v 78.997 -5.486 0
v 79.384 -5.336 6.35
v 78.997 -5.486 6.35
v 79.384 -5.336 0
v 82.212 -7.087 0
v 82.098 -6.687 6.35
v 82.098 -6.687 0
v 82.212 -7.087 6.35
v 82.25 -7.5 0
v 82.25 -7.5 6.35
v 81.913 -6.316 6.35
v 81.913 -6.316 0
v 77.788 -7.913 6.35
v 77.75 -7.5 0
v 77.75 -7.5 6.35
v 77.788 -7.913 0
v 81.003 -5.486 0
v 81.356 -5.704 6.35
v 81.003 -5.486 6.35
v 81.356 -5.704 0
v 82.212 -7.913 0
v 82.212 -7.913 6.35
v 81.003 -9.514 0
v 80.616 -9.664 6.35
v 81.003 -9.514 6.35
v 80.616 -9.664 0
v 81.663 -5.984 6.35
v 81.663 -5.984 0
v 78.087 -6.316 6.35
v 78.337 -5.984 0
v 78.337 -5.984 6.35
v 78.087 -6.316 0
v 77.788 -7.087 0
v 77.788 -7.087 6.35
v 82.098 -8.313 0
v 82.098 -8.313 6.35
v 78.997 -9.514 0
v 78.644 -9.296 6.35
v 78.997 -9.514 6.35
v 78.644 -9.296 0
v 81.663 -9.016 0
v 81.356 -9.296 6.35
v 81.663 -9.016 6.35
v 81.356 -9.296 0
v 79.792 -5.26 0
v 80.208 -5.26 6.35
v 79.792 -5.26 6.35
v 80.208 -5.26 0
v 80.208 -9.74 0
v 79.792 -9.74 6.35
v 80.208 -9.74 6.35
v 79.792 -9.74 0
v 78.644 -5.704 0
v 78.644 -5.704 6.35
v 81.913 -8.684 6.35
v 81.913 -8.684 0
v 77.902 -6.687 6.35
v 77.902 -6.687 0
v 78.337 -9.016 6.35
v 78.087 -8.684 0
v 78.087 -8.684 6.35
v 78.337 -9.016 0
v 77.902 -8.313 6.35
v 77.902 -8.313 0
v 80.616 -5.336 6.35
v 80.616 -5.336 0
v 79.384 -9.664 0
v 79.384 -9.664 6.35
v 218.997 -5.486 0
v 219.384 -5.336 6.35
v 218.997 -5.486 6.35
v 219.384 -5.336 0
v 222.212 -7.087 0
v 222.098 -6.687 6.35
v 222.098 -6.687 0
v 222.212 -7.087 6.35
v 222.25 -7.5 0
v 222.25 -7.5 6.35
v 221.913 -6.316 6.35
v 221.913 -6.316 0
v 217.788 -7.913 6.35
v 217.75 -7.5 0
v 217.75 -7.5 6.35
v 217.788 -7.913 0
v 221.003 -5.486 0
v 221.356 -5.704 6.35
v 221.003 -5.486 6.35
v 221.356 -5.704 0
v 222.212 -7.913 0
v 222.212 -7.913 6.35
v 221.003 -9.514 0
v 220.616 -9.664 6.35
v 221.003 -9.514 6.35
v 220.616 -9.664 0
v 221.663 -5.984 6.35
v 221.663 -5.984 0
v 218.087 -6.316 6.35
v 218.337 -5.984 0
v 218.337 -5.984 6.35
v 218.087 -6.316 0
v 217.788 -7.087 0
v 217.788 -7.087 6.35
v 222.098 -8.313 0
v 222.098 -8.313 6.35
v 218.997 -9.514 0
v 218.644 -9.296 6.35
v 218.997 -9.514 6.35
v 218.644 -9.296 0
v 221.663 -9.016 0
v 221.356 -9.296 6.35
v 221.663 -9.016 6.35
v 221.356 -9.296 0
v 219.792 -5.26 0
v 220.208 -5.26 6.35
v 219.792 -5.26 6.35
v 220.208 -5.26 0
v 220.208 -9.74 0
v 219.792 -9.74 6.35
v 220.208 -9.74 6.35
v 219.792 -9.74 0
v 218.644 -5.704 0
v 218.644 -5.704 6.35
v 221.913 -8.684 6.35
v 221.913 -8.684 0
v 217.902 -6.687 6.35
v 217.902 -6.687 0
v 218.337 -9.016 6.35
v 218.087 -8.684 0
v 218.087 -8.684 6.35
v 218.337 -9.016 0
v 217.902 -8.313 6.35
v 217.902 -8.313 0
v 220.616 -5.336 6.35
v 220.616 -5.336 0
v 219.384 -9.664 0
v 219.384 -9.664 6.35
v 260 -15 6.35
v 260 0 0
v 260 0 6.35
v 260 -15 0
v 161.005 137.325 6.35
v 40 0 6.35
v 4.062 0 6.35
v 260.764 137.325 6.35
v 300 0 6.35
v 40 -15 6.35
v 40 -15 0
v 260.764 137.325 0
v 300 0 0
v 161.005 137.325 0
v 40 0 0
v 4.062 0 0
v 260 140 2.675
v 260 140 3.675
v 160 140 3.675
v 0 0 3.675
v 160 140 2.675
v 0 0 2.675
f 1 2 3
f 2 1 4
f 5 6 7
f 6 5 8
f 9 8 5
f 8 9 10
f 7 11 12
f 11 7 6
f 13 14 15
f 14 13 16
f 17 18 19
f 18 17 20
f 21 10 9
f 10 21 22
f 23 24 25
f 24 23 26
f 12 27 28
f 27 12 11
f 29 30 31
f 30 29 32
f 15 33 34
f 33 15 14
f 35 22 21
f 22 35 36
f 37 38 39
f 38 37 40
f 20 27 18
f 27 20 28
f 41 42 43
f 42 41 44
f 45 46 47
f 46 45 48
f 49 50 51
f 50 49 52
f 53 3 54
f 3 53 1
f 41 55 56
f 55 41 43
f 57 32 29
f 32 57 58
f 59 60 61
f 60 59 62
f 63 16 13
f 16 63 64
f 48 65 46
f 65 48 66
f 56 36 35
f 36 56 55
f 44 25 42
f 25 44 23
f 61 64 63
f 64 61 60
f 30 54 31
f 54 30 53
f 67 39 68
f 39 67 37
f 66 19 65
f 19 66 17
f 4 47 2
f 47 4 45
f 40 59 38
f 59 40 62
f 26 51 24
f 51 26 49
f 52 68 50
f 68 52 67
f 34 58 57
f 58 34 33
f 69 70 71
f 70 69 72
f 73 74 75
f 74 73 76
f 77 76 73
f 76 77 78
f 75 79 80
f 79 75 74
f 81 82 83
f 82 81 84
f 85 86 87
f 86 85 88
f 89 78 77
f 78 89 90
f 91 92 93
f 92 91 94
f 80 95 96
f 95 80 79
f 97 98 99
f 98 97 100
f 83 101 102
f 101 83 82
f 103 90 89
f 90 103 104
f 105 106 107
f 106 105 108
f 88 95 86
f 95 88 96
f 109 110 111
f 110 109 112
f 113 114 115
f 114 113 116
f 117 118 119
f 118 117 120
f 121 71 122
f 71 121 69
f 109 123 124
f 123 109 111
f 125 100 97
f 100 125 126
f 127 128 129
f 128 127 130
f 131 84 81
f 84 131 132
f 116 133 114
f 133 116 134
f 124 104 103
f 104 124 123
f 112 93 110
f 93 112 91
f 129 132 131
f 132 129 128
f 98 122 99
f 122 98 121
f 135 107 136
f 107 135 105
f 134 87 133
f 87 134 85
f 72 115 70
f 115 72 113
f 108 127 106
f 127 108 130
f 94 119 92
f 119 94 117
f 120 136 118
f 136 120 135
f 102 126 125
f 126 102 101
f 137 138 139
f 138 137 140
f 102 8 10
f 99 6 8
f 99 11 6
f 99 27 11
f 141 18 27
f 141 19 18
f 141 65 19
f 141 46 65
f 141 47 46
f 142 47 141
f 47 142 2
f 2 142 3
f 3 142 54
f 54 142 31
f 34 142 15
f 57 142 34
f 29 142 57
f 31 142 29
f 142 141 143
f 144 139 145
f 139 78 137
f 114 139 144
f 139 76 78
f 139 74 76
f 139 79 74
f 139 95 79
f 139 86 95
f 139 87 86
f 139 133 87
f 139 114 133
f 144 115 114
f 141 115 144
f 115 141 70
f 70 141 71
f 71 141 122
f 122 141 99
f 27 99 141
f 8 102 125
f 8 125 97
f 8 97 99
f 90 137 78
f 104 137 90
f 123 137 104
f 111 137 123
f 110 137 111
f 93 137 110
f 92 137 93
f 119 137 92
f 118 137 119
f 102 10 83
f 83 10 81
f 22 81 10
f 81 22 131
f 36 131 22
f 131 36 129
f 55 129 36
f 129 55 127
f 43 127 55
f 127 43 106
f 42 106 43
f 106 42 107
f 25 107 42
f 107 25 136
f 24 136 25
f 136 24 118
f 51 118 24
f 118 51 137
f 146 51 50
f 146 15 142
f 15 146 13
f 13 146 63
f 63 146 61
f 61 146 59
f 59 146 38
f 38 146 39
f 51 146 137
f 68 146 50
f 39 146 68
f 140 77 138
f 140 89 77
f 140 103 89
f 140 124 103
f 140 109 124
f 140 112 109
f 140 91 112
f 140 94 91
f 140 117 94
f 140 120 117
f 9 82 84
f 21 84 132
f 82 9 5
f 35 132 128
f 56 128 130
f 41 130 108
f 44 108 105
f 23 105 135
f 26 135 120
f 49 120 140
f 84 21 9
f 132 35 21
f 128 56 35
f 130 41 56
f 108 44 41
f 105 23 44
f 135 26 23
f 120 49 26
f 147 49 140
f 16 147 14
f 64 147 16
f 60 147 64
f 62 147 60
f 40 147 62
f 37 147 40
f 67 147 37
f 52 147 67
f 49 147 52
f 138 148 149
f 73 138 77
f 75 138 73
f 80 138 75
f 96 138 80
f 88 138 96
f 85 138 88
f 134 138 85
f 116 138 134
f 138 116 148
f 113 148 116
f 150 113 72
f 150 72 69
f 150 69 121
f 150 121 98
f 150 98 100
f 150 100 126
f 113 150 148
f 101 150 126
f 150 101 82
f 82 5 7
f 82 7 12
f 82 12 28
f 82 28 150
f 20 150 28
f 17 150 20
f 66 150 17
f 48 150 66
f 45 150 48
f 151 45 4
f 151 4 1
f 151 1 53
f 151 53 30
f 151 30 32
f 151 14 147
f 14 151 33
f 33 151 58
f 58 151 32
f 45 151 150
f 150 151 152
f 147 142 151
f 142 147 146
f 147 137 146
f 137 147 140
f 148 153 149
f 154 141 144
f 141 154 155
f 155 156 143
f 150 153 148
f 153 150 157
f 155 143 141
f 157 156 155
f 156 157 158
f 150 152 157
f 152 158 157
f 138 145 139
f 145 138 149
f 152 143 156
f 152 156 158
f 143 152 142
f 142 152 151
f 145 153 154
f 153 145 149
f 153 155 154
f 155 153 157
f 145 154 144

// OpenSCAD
// PART: Clipped-delta fin with through-the-wall tab, 300 root / 100 tip / 140 span, 1/4 in 6061-T6 plate
// KIND: mechanical
// MAKE: CNC mill from 6.35 mm 6061-T6 plate (waterjet the outline first if available); mill the 45 deg LE and tip bevels both faces on a vacuum plate, 2 setups (flip on the two tab holes); ream/drill tab holes 4.50 in setup 1; calipers on chords/span/tab, 45 deg angle gauge and 1.0 feeler on the bevel flat, pins in the holes
// NOTE: Fin laid flat, thickness along Z, root edge on Y=0, leading edge from the origin; tab hangs in -Y so main() spans Y -15..140
// NOTE: Root chord 300.00 mm = 11.811 in; tip chord 100.00 = 3.937 in; semi-span 140.00 = 5.512 in; LE sweep 160.00 = 6.299 in; thickness 6.35 = 1/4 in plate
// NOTE: Airframe 6.000 in OD = 152.40 mm with 2.0 mm wall (ID 148.4) and a 98 mm motor mount tube OD 101.60 = 4.000 in are ASSUMED; tab_h 15 is the brief's value and only reaches part-way to the MMT: for the tab to bottom on the MMT set tab_h = wall + (ID - MMT_OD)/2 = 2.0 + 23.4 = 25.4
// NOTE: Bevels: leading edge and tip chamfered 45 deg on BOTH faces leaving a 1.00 mm flat (1.88 mm per face); trailing edge and root stay square. A knife edge on G10 chips, keep the flat
// NOTE: Tab holes: 2 x 4.50 mm (M4 clearance, ISO 273 medium; 4.5 mm is a standard drill) at X 80 / 220, Y -7.5: injected fillet epoxy keys through them and they take 4 mm dowels in a fin-can alignment jig. Optional: set tab_hole_pitch or delete the loop
// NOTE: FLUTTER as drawn FAILS the declared 700 m/s at 3000 m: NACA TN 4197 (Martin) with G = 4.1 GPa gives Vf about 290 m/s (centroid epsilon) to 334 m/s (Martin epsilon 0.25), SF 0.41-0.48 vs sf_min 1.5. This 4.76 plate is a Mach 0.6 fin. For 700 m/s at SF 1.5 use fin_t = 12.70 (1/2 in G10, Vf about 1260 m/s, SF 1.8) or a tip-to-tip carbon layup (outside the formula)
// NOTE: G10-FR4 shear modulus 4.1 GPa is Bennett's (2025) working value (600 ksi); direct measurements report about 5.3 GPa (775 ksi). E about 18 GPa lengthwise, density 1.85 g/cm3. 6061-T6 plate (G 26 GPa) is the machined alternative: Vf about 730 m/s at 4.76 (SF 1.04), about 1120 m/s at 6.35 (SF 1.6)
// NOTE: Waterjet holds +/-0.1 on 4.76 mm G10 at quality 4-5, so the +/-0.20 on chords, span and tab is the process capability, not ISO 2768-m general (+/-0.5 over 120-400)
// SPEC-BEGIN
// {"name":"Clipped-delta G10 fin with TTW tab","size_mm":[300,155,6.35],
//  "parts":[{"name":"fin","role":"clipped-delta plate, LE and tip bevelled 45 deg both faces","size_mm":[300,140,6.35]},
//           {"name":"tab","role":"through-the-wall root tab with 2 epoxy-key holes, overlaps the fin root by 2","size_mm":[220,17,6.35]}],
//  "joints":[{"a":"tab","b":"fin","overlap_mm":2}],
//  "layout":[{"a":"tab","rel":"front","b":"fin"}],
//  "profile":[{"part":"fin","along":"y","measure":"x","from_mm":300,"to_mm":100,"why":"clipped delta: chord tapers from the root to the tip"}]}
// SPEC-END
// FLIGHT-BEGIN
// {"material":"6061-T6","process":"cnc_mill","tolerance_class":"ISO 2768-m","tess_tol_mm":0.01,"hazard":"none",
//  "critical":[{"name":"root chord","module":"fin","axis":"x","nominal_mm":300.00,"tol_mm":0.20,"tol_src":"default"},
//              {"name":"semi-span","module":"fin","axis":"y","nominal_mm":140.00,"tol_mm":0.20,"tol_src":"default"},
//              {"name":"plate thickness","module":"fin","axis":"z","nominal_mm":6.35,"tol_mm":0.05,"round":false,"tol_src":"default"},
//              {"name":"tip chord at the tip flat","module":"tip_chord_gauge","axis":"x","nominal_mm":100.00,"tol_mm":0.20,"tol_src":"default"},
//              {"name":"tab length","module":"tab","axis":"x","nominal_mm":220.00,"tol_mm":0.20,"tol_src":"default"},
//              {"name":"tab height below the root","module":"tab_gauge","axis":"y","nominal_mm":15.00,"tol_mm":0.20,"tol_src":"default"},
//              {"name":"overall height, tab to tip","module":"main","axis":"y","nominal_mm":155.00,"tol_mm":0.30,"tol_src":"default"}],
//  "bores":[],
//  "holes":[{"name":"tab epoxy-key holes","d_mm":4.50,"tol_mm":0.10,"pattern":"list","at_mm":[[80,-7.5],[220,-7.5]],"axis":"z","from_mm":0,"to_mm":6.35,"tol_src":"default"}],
//  "gauges":[{"name":"LE bevel GO","module":"gauge_le_bevel","expect":"clear","why":"45 deg bevel fully cut on both faces along the whole leading edge"},
//            {"name":"LE flat present","module":"gauge_le_flat","expect":"interfere","why":"the 1.0 mm leading-edge flat exists, not a knife edge"}],
//  "loads":[{"check":"flutter","name":"fin at max Q","root_mm":300,"tip_mm":100,"span_mm":140,"thick_mm":6.35,"v_max_m_s":700,"alt_m":3000,"sf_min":1.5,"inputs_src":"default"}],
//  "mfg":{"stock":"6.35 mm (1/4 in) 6061-T6 plate, 320 x 175 mm blank per fin",
//         "finish":"as cut; scuff the whole tab and a 12 mm band each side of the root with 80 grit before epoxy",
//         "heat_treat":"none",
//         "deburr":"break all waterjet edges 0.3-0.5 mm with 220 grit (no machined chamfer on root, TE or tab edges); the bevels keep their 1.0 mm flat, do not sand to a knife edge",
//         "inspect":["root chord, tip chord, span and tab length with calipers","thickness with a micrometer at 4 places (sheet as supplied)","bevel angle with a 45 deg angle gauge; flat width 1.0 with a feeler against a straightedge","tab holes with 4.38 GO / 4.60 NO-GO pins"],
//         "notes":["Waterjet: 0.8 mm garnet kerf, quality 4-5 edge, taper under 0.05 on 4.76 mm; pierce outside the profile; cut with the LE 1.88 mm oversize only if the bevel is to be milled to a witness line",
//                  "Bevels: 45 deg chamfer mill or tilted head, both faces, on a vacuum plate or toe clamps in the tab holes; the bevel runs out at the root corner and mitres into the tip bevel",
//                  "Bond: tab through the airframe slot to the motor mount, 4 internal fillets, epoxy injected through the tab holes forms keys; external fillets 10 mm radius",
//                  "Flutter SF at 700 m/s is under 1 as drawn (see NOTE): change fin_t or v_max before a Mach 2 flight; the app recomputes the loads row from fin_t",
//                  "6061-T6 alternative: same file, material 6061-T6, process cnc_mill, chamfer all edges 0.5 x 45 with a chamfer mill and add 0.5 x 45 to the deburr line"]}}
// FLIGHT-END
tess_tol = 0.01; // max chordal deviation of curved surfaces (mm)
root_c = 300.00; // root chord, along X on Y=0 (11.811 in)
tip_c = 100.00; // tip chord, along X at Y=span (3.937 in)
span = 140.00; // semi-span, root edge to tip edge along Y (5.512 in)
le_sweep = 160.00; // leading-edge sweep: X offset of the tip LE corner from the root LE corner (6.299 in)
fin_t = 6.35; // plate thickness, 1/4 in 6061-T6 plate, critical (flutter SF 1.6 at 700 m/s; G10 at 4.76 fails, see NOTE)
le_flat = 1.00; // flat left on the leading edge and tip after bevelling (G10 knife edges chip)
bevel_ang = 45; // bevel angle from the plate face, degrees (OpenSCAD trig is in degrees)
tab_len = 220.00; // TTW tab length along X, centred on the root chord (8.661 in)
tab_h = 15.00; // tab height below the root, through the airframe wall toward the MMT (see NOTE: 25.4 bottoms on a 98 mm MMT in a 6 in tube)
tab_overlap = 2.00; // tab extends this far into the fin body so the SPEC joint has real shared volume
tab_hole_d = 4.50; // tab epoxy-key / jig-pin holes, M4 clearance ISO 273 medium, 4.5 mm standard drill
tab_hole_pitch = 140.00; // spacing of the two tab holes, symmetric about the tab centre (X 80 and 220)
cut_ext = 1; // hole cutters overshoot each face by this much so the boolean is clean
gauge_gap = 0.10; // clearance between the bevel GO gauge and the nominal bevel plane
gauge_slab = 0.01; // thickness of the slab that samples the tip chord at the tip flat
// --- end parameters ---
function fn_tol(d, tol=tess_tol) = max(24, ceil(180 / acos(1 - min(0.5, 2*tol/d))));
// Derived geometry. atan2/sin/tan take and return DEGREES in OpenSCAD, so no radian conversion anywhere.
le_ang = atan2(span, le_sweep); // leading-edge angle from the root chord, degrees (41.19 for 140/160)
le_len = sqrt(le_sweep*le_sweep + span*span); // leading-edge length (212.60)
bevel_in = (fin_t - le_flat)/2 / tan(bevel_ang); // in-plane inset of each bevel at the plate face (1.88 at 45 deg)
z_flat_lo = (fin_t - le_flat)/2; // bottom of the LE/tip flat (1.88)
z_flat_hi = z_flat_lo + le_flat; // top of the LE/tip flat (2.88)
// Planform with the LE and tip edges moved inward by d; root and TE stay put. d=0 is the outer outline.
// A line shifted d perpendicular to itself moves d/sin(le_ang) along the root, which is what the LE corner needs.
function planform(d) = [
  [d / sin(le_ang), 0],
  [root_c, 0],
  [root_c + (le_sweep + tip_c - root_c) * (span - d) / span, span - d],
  [(span - d) * le_sweep / span + d / sin(le_ang), span - d]
];
module fin(){ // one convex hull: the 1.0 flat at mid-thickness plus the full-thickness inset core = 45 deg bevels on LE and tip, square root and TE
  hull(){
    translate([0, 0, z_flat_lo]) linear_extrude(le_flat) polygon(planform(0));
    linear_extrude(fin_t) polygon(planform(bevel_in));
  }
}
module tab(){ // root tab in -Y, overlapping the fin root by tab_overlap; the two holes are the only boolean in the file
  difference(){
    translate([root_c/2 - tab_len/2, -tab_h, 0]) cube([tab_len, tab_h + tab_overlap, fin_t]);
    for(x = [root_c/2 - tab_hole_pitch/2, root_c/2 + tab_hole_pitch/2])
      translate([x, -tab_h/2, -cut_ext]) cylinder(d=tab_hole_d, h=fin_t + 2*cut_ext, $fn=fn_tol(tab_hole_d));
  }
}
module main(){ union(){ fin(); tab(); } }
// --- inspection modules (referenced by FLIGHT critical/gauges; not SPEC parts) ---
module tip_chord_gauge(){ // sliver of the fin at the tip flat: its X extent is the tip chord
  intersection(){ fin(); translate([-1, span - gauge_slab, -1]) cube([root_c + 2, gauge_slab + 1, fin_t + 2]); }
}
module tab_gauge(){ // everything below the root line: its Y extent is the tab height
  intersection(){ main(); translate([-1, -tab_h - 1, -1]) cube([root_c + 2, tab_h + 1, fin_t + 2]); }
}
module gauge_le_bevel(){ // two 45 deg wedges riding gauge_gap above the upper and below the lower LE bevel, full LE length: expect clear
  intersection(){
    main();
    rotate([0, 0, le_ang]) rotate([90, 0, 90]) linear_extrude(le_len) union(){
      polygon([[0, z_flat_hi + gauge_gap], [-(bevel_in - gauge_gap), fin_t], [0, fin_t]]);
      polygon([[0, z_flat_lo - gauge_gap], [-(bevel_in - gauge_gap), 0], [0, 0]]);
    }
  }
}
module gauge_le_flat(){ // thin block on the LE at the bottom 0.1-0.2 of the flat, middle 80% of the LE: expect contact (empty if ground to a knife edge)
  intersection(){
    main();
    rotate([0, 0, le_ang]) translate([0.1*le_len, -0.05, z_flat_lo + 0.1]) cube([0.8*le_len, 0.05, 0.1]);
  }
}
main();
